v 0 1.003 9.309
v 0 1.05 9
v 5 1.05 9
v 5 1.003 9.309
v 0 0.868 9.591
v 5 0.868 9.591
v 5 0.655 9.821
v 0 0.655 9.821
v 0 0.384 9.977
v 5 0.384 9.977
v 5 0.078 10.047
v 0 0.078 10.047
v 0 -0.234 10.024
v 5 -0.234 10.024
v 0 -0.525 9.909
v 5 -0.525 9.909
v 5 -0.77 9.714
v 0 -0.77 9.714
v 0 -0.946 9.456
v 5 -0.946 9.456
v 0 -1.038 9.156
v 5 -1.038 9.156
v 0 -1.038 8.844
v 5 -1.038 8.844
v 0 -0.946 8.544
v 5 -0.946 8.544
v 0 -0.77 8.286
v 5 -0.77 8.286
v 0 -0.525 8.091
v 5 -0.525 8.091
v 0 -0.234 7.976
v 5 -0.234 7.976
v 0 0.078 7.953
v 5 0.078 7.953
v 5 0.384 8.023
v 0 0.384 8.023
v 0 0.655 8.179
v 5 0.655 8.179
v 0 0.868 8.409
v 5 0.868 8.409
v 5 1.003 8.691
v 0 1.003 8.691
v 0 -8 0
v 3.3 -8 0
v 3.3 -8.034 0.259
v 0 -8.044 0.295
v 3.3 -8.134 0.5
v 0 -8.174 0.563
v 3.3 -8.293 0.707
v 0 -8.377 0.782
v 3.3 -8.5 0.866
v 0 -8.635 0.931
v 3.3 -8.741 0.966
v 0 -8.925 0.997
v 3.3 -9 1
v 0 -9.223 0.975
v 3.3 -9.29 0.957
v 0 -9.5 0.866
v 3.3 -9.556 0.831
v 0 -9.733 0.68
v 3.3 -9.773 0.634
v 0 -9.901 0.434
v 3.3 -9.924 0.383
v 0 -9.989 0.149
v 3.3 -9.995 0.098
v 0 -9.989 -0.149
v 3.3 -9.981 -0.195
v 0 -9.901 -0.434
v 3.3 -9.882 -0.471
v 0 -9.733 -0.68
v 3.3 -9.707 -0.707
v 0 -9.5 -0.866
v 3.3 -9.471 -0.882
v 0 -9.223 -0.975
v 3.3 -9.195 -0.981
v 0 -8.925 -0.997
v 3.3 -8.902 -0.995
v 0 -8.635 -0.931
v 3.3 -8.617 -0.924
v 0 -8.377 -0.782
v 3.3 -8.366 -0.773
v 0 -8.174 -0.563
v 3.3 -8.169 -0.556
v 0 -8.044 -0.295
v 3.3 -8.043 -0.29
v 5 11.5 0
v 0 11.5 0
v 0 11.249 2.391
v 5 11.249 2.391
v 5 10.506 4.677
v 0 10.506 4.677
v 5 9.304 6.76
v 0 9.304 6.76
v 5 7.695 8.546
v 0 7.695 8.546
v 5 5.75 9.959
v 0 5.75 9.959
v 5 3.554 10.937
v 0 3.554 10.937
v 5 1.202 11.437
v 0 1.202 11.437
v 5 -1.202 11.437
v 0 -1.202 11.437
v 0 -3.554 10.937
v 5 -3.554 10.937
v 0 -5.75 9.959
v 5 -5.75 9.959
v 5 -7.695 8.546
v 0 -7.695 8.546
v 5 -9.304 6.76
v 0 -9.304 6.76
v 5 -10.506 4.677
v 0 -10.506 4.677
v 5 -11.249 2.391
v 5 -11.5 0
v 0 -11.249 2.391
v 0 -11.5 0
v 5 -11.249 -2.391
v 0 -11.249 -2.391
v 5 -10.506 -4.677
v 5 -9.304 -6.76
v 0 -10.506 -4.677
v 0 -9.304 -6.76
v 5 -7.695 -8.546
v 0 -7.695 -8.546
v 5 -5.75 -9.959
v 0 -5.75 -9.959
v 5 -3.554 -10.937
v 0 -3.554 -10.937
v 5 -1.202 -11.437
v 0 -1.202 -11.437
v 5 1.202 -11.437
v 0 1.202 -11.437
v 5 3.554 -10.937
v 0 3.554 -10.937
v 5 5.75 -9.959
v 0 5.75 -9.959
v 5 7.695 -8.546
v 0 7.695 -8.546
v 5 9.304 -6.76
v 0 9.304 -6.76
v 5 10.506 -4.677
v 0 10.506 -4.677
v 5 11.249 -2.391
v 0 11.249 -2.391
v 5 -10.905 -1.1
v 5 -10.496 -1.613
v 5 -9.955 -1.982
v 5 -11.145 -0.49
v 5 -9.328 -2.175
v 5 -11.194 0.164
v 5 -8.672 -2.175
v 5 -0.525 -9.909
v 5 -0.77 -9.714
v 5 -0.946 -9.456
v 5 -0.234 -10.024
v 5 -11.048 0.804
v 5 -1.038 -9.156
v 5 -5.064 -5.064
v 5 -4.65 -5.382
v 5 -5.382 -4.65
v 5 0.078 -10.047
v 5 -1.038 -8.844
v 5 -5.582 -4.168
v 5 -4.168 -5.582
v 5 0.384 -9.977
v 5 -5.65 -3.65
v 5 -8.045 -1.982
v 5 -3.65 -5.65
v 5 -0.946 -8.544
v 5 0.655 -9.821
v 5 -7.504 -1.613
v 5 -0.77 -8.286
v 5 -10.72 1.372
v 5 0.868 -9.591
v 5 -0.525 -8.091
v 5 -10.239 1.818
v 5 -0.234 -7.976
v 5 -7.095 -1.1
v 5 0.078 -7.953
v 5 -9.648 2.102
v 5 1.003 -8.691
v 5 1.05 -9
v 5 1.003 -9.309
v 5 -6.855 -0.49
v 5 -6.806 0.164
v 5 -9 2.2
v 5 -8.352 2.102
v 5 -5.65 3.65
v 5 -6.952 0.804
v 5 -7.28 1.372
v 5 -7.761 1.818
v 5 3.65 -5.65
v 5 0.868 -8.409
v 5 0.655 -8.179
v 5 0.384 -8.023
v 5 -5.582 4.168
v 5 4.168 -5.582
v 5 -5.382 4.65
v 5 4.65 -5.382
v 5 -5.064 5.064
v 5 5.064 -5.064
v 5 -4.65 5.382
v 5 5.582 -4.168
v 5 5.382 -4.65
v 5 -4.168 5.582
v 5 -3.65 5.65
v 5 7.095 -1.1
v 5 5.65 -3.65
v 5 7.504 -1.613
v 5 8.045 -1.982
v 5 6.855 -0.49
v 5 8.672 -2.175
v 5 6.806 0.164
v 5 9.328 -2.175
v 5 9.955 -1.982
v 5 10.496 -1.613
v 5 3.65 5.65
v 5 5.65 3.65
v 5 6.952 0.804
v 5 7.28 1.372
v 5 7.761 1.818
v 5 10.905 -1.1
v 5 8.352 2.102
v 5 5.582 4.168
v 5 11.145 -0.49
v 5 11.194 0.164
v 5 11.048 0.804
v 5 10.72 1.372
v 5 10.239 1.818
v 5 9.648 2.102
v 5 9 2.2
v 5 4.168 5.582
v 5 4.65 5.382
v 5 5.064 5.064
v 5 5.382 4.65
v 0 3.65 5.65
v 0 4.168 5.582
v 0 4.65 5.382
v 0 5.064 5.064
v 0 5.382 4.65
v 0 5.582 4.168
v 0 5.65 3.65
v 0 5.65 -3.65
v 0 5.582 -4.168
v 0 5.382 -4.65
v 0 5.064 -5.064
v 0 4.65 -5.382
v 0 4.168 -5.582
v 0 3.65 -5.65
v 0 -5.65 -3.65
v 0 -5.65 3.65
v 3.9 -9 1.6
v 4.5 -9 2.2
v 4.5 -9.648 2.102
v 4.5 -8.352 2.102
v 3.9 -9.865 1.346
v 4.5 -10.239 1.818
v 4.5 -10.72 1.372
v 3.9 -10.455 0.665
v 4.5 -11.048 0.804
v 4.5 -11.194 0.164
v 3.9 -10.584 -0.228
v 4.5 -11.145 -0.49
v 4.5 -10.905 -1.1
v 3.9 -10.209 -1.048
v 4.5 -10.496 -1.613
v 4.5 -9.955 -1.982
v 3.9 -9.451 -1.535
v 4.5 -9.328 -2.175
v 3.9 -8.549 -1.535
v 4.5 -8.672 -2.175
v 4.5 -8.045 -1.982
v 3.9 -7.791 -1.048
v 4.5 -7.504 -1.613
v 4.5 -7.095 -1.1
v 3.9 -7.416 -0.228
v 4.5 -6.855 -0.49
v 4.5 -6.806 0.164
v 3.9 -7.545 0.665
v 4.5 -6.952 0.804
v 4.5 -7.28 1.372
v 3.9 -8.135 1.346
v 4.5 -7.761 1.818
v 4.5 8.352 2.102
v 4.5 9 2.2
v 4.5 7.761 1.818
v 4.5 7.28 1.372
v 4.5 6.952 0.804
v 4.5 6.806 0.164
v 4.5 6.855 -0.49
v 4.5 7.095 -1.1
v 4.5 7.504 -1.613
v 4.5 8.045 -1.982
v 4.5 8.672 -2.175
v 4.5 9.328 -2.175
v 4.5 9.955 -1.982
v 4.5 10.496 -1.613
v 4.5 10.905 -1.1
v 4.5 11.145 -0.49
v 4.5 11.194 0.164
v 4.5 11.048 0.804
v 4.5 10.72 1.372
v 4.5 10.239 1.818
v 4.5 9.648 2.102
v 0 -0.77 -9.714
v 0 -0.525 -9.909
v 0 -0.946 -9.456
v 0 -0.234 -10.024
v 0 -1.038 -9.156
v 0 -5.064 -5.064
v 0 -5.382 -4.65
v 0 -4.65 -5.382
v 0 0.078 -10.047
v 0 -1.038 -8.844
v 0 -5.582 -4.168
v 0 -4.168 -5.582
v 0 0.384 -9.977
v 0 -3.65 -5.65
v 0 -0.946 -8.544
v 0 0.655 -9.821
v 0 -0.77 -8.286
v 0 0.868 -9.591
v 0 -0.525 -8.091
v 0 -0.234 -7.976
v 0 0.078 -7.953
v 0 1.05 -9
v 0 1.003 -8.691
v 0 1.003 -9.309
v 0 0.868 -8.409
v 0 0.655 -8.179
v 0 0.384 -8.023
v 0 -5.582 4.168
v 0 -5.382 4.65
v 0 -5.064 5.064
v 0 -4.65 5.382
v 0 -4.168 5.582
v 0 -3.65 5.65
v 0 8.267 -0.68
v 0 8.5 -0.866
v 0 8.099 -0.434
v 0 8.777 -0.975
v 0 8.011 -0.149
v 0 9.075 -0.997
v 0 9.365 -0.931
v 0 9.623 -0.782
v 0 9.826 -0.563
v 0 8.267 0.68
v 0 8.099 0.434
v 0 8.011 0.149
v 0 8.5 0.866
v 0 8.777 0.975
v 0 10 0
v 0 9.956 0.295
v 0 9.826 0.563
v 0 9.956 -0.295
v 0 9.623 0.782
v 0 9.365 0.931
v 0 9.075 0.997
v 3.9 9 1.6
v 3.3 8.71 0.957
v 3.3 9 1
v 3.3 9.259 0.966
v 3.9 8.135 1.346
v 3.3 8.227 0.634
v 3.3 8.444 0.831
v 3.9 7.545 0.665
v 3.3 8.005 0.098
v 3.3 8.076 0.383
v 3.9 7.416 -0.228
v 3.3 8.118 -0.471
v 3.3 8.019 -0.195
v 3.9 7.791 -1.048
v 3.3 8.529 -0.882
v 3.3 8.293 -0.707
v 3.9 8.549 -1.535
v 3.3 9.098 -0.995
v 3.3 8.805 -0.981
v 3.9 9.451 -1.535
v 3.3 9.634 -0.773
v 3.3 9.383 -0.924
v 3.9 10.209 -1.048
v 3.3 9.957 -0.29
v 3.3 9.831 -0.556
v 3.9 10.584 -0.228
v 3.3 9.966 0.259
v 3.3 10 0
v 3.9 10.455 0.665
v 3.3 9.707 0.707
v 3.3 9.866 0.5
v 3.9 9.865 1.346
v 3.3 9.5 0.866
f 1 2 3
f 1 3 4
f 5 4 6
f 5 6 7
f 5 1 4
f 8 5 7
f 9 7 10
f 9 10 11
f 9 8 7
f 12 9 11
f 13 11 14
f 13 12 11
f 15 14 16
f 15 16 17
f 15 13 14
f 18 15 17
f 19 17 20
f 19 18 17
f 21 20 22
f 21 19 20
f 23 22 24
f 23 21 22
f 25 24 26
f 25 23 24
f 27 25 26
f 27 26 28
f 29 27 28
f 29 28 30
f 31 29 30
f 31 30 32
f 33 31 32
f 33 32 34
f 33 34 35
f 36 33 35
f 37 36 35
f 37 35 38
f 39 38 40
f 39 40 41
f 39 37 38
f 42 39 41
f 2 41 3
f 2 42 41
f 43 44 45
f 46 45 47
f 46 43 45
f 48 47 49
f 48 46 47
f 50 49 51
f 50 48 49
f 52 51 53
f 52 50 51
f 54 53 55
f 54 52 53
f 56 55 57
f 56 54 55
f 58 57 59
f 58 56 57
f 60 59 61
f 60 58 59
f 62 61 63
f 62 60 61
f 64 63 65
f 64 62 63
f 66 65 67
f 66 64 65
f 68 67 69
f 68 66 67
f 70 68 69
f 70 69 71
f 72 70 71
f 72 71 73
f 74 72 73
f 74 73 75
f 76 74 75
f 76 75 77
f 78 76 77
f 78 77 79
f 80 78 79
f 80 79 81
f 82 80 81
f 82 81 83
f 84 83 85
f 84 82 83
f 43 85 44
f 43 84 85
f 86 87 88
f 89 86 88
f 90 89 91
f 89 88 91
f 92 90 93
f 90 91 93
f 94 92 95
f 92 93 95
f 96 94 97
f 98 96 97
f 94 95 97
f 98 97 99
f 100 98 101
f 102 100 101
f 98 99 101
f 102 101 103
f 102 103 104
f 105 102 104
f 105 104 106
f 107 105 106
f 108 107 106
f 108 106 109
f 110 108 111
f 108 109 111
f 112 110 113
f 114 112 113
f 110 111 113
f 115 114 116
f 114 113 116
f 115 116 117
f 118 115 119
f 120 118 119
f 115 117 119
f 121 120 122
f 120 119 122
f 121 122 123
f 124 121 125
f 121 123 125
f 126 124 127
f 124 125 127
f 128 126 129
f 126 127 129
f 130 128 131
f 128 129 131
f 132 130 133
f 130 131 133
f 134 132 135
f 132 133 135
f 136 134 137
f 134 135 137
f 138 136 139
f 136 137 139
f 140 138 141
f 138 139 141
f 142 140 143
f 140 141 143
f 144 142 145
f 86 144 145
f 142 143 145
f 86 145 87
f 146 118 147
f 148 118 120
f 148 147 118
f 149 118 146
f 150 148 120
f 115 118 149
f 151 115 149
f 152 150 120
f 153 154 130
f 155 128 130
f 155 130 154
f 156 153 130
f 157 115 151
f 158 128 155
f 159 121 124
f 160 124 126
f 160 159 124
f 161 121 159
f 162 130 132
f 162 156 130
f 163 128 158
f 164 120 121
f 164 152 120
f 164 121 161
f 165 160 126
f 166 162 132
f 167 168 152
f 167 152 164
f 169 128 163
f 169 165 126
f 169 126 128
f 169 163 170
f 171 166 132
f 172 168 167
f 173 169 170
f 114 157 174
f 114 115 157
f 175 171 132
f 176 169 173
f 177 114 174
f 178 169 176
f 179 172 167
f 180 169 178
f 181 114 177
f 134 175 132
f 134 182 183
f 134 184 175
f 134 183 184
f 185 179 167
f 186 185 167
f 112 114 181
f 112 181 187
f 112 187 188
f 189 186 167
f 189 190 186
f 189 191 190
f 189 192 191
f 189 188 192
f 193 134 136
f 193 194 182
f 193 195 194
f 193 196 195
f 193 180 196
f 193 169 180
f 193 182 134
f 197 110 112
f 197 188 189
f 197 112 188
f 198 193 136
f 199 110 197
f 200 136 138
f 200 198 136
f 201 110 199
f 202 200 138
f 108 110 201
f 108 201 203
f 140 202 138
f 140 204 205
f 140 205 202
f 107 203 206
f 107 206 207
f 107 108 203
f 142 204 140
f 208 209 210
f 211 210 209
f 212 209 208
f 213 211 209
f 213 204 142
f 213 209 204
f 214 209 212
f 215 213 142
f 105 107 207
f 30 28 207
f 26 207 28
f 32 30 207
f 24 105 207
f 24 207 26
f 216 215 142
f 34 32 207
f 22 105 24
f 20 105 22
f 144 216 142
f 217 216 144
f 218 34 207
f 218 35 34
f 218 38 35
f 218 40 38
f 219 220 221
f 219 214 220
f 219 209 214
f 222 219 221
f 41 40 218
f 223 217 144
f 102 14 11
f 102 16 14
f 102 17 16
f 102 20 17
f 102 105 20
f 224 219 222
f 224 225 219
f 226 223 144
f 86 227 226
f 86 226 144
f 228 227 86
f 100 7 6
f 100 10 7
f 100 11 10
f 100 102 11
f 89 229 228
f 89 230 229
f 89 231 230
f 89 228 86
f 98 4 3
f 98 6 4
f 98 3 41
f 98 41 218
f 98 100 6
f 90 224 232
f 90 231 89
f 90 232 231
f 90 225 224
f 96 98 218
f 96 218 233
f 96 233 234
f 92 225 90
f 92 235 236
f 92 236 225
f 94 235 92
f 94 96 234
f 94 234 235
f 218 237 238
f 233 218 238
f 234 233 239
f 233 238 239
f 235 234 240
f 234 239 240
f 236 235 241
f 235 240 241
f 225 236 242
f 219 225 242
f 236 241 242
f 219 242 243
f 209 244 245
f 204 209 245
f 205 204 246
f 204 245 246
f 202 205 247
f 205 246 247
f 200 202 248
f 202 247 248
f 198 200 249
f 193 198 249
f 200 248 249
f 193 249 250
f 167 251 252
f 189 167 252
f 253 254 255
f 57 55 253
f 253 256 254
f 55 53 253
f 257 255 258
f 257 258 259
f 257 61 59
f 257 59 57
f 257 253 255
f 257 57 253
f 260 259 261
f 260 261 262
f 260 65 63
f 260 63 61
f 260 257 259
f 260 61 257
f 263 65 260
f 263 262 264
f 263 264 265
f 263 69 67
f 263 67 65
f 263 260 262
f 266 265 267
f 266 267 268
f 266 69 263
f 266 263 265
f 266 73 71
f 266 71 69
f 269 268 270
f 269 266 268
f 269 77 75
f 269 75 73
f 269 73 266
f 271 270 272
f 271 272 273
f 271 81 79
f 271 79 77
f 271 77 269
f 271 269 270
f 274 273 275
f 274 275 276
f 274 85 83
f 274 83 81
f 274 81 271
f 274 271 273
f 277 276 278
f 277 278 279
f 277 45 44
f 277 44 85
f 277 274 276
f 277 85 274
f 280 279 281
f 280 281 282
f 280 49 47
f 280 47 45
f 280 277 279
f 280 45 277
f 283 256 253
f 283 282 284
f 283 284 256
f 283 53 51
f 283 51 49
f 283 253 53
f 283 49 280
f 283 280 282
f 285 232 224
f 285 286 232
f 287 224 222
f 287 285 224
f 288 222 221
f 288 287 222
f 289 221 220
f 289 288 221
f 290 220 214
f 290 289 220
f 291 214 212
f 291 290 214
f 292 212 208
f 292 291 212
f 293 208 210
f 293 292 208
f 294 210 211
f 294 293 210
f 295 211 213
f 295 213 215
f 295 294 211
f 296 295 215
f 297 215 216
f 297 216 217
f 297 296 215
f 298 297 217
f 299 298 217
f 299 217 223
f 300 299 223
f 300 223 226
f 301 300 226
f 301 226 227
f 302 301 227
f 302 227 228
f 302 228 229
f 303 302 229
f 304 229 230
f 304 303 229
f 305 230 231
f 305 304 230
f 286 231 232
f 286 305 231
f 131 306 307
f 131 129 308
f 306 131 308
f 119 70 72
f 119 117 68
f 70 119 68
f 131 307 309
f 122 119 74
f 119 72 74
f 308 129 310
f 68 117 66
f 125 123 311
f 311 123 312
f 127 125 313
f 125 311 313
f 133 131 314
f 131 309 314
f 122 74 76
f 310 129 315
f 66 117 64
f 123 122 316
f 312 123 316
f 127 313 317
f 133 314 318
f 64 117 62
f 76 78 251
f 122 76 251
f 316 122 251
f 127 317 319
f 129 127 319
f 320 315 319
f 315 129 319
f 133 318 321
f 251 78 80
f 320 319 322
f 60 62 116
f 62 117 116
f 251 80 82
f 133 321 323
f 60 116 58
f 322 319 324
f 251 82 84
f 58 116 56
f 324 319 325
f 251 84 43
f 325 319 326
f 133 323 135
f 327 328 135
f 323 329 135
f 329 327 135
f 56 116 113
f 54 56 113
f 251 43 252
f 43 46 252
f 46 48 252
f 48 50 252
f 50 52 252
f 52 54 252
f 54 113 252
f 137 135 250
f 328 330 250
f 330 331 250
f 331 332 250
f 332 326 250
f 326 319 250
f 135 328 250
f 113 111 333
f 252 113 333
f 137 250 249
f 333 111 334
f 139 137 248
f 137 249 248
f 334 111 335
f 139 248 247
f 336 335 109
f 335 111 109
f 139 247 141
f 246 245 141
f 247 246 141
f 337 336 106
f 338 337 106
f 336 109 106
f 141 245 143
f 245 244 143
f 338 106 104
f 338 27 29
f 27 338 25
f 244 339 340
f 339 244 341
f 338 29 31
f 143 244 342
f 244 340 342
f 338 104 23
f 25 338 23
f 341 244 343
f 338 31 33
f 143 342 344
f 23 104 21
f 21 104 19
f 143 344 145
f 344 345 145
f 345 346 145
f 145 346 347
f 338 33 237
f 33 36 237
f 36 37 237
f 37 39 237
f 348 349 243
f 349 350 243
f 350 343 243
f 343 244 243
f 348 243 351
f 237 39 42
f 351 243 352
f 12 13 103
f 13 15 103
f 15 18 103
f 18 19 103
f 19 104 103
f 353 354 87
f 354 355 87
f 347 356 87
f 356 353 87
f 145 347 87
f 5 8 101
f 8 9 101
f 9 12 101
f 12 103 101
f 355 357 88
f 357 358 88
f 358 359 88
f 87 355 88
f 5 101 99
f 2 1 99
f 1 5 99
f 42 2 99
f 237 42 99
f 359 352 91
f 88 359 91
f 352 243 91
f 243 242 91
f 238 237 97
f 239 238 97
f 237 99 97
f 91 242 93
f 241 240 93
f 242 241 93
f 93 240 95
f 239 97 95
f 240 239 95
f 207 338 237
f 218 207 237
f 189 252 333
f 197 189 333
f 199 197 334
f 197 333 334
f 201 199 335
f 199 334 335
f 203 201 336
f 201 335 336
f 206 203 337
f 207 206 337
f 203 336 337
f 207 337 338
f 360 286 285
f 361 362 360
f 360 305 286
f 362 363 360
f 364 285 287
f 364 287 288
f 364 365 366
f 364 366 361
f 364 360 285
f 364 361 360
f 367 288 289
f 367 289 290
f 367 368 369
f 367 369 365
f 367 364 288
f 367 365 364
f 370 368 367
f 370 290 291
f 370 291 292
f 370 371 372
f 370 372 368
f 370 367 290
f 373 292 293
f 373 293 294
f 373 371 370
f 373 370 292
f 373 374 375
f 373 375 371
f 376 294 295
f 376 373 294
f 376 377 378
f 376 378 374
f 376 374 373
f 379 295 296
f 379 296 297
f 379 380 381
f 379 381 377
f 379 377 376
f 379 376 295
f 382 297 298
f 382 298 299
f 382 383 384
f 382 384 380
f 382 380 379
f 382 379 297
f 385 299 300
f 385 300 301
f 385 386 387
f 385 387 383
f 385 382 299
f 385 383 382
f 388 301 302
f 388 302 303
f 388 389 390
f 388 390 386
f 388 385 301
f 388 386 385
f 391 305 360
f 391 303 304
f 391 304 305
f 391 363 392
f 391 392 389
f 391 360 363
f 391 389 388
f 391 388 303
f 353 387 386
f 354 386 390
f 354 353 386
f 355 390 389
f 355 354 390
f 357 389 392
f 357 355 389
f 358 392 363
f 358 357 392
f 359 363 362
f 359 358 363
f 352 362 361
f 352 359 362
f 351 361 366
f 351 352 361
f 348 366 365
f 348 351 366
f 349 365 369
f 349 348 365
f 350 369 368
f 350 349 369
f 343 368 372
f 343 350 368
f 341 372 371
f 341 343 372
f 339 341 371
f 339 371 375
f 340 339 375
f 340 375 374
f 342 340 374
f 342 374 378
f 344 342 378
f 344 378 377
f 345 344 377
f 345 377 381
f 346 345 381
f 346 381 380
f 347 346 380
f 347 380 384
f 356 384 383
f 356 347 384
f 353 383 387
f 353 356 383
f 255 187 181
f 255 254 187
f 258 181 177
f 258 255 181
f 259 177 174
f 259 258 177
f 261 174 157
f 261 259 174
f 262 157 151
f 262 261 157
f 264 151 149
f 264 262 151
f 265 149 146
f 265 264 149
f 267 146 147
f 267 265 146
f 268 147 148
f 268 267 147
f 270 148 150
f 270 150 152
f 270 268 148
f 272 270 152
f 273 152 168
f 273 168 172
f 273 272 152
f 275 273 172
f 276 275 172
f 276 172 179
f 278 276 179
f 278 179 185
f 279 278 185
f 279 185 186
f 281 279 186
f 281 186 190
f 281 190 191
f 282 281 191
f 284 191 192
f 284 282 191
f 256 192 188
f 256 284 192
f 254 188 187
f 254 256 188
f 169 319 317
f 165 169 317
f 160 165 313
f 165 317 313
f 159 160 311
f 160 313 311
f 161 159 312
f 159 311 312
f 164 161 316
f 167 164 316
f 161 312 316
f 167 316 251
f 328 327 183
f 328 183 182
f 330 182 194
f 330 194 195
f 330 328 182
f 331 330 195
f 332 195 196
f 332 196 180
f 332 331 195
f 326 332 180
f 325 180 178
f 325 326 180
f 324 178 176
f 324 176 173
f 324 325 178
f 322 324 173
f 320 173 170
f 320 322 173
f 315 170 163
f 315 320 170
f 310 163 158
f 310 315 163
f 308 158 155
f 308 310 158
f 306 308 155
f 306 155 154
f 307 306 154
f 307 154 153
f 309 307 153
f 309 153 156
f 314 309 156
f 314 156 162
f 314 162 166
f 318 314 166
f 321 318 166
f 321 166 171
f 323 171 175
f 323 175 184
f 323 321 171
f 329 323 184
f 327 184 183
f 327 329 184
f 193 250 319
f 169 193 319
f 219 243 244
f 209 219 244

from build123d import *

# Parameters (mm, degrees)
F0_R     = 11.5
F0_R_2   = 1.05
F0_R_3   = 1
F1_DEPTH = 5


with BuildPart() as f1:
    # F0 (on Right) → F1 (new body)
    with BuildSketch(Plane.YZ):
        Circle(F0_R)
        with Locations((0, -9)):
            Circle(F0_R_2, mode=Mode.SUBTRACT)
        with Locations((-9, 0)):
            Circle(F0_R_3, mode=Mode.SUBTRACT)
        with BuildLine():
            ThreePointArc((-5.65, 3.65), (-5.064214, 5.064214), (-3.65, 5.65))
            Line((-3.65, 5.65), (3.65, 5.65))
            ThreePointArc((3.65, 5.65), (5.064214, 5.064214), (5.65, 3.65))
            Line((5.65, 3.65), (5.65, -3.65))
            ThreePointArc((5.65, -3.65), (5.064214, -5.064214), (3.65, -5.65))
            Line((3.65, -5.65), (-3.65, -5.65))
            ThreePointArc((-3.65, -5.65), (-5.064214, -5.064214), (-5.65, -3.65))
            Line((-5.65, -3.65), (-5.65, 3.65))
        make_face(mode=Mode.SUBTRACT)
        with Locations((9, 0)):
            Circle(F0_R_3, mode=Mode.SUBTRACT)
        with Locations((0, 9)):
            Circle(F0_R_2, mode=Mode.SUBTRACT)
    extrude(amount=F1_DEPTH)

    # F3 (on offset) → F5 (revolve, cut)
    with BuildSketch(Plane.XZ.offset(9)):
        Polygon((2.3, 0), (5, 0), (5, 2.2), (4.5, 2.2), align=None)
    revolve(axis=Axis((2.750115, -9, 0), (1, 0, 0)), mode=Mode.SUBTRACT)

    # F7 (on offset) → F8 (revolve, cut)
    with BuildSketch(Plane.XZ.offset(-9)):
        Polygon((4.5, 2.2), (2.3, 0), (5, 0), (5, 2.2), align=None)
    revolve(axis=Axis((3.65, 9, 0), (1, 0, 0)), mode=Mode.SUBTRACT)


solid = f1.part
